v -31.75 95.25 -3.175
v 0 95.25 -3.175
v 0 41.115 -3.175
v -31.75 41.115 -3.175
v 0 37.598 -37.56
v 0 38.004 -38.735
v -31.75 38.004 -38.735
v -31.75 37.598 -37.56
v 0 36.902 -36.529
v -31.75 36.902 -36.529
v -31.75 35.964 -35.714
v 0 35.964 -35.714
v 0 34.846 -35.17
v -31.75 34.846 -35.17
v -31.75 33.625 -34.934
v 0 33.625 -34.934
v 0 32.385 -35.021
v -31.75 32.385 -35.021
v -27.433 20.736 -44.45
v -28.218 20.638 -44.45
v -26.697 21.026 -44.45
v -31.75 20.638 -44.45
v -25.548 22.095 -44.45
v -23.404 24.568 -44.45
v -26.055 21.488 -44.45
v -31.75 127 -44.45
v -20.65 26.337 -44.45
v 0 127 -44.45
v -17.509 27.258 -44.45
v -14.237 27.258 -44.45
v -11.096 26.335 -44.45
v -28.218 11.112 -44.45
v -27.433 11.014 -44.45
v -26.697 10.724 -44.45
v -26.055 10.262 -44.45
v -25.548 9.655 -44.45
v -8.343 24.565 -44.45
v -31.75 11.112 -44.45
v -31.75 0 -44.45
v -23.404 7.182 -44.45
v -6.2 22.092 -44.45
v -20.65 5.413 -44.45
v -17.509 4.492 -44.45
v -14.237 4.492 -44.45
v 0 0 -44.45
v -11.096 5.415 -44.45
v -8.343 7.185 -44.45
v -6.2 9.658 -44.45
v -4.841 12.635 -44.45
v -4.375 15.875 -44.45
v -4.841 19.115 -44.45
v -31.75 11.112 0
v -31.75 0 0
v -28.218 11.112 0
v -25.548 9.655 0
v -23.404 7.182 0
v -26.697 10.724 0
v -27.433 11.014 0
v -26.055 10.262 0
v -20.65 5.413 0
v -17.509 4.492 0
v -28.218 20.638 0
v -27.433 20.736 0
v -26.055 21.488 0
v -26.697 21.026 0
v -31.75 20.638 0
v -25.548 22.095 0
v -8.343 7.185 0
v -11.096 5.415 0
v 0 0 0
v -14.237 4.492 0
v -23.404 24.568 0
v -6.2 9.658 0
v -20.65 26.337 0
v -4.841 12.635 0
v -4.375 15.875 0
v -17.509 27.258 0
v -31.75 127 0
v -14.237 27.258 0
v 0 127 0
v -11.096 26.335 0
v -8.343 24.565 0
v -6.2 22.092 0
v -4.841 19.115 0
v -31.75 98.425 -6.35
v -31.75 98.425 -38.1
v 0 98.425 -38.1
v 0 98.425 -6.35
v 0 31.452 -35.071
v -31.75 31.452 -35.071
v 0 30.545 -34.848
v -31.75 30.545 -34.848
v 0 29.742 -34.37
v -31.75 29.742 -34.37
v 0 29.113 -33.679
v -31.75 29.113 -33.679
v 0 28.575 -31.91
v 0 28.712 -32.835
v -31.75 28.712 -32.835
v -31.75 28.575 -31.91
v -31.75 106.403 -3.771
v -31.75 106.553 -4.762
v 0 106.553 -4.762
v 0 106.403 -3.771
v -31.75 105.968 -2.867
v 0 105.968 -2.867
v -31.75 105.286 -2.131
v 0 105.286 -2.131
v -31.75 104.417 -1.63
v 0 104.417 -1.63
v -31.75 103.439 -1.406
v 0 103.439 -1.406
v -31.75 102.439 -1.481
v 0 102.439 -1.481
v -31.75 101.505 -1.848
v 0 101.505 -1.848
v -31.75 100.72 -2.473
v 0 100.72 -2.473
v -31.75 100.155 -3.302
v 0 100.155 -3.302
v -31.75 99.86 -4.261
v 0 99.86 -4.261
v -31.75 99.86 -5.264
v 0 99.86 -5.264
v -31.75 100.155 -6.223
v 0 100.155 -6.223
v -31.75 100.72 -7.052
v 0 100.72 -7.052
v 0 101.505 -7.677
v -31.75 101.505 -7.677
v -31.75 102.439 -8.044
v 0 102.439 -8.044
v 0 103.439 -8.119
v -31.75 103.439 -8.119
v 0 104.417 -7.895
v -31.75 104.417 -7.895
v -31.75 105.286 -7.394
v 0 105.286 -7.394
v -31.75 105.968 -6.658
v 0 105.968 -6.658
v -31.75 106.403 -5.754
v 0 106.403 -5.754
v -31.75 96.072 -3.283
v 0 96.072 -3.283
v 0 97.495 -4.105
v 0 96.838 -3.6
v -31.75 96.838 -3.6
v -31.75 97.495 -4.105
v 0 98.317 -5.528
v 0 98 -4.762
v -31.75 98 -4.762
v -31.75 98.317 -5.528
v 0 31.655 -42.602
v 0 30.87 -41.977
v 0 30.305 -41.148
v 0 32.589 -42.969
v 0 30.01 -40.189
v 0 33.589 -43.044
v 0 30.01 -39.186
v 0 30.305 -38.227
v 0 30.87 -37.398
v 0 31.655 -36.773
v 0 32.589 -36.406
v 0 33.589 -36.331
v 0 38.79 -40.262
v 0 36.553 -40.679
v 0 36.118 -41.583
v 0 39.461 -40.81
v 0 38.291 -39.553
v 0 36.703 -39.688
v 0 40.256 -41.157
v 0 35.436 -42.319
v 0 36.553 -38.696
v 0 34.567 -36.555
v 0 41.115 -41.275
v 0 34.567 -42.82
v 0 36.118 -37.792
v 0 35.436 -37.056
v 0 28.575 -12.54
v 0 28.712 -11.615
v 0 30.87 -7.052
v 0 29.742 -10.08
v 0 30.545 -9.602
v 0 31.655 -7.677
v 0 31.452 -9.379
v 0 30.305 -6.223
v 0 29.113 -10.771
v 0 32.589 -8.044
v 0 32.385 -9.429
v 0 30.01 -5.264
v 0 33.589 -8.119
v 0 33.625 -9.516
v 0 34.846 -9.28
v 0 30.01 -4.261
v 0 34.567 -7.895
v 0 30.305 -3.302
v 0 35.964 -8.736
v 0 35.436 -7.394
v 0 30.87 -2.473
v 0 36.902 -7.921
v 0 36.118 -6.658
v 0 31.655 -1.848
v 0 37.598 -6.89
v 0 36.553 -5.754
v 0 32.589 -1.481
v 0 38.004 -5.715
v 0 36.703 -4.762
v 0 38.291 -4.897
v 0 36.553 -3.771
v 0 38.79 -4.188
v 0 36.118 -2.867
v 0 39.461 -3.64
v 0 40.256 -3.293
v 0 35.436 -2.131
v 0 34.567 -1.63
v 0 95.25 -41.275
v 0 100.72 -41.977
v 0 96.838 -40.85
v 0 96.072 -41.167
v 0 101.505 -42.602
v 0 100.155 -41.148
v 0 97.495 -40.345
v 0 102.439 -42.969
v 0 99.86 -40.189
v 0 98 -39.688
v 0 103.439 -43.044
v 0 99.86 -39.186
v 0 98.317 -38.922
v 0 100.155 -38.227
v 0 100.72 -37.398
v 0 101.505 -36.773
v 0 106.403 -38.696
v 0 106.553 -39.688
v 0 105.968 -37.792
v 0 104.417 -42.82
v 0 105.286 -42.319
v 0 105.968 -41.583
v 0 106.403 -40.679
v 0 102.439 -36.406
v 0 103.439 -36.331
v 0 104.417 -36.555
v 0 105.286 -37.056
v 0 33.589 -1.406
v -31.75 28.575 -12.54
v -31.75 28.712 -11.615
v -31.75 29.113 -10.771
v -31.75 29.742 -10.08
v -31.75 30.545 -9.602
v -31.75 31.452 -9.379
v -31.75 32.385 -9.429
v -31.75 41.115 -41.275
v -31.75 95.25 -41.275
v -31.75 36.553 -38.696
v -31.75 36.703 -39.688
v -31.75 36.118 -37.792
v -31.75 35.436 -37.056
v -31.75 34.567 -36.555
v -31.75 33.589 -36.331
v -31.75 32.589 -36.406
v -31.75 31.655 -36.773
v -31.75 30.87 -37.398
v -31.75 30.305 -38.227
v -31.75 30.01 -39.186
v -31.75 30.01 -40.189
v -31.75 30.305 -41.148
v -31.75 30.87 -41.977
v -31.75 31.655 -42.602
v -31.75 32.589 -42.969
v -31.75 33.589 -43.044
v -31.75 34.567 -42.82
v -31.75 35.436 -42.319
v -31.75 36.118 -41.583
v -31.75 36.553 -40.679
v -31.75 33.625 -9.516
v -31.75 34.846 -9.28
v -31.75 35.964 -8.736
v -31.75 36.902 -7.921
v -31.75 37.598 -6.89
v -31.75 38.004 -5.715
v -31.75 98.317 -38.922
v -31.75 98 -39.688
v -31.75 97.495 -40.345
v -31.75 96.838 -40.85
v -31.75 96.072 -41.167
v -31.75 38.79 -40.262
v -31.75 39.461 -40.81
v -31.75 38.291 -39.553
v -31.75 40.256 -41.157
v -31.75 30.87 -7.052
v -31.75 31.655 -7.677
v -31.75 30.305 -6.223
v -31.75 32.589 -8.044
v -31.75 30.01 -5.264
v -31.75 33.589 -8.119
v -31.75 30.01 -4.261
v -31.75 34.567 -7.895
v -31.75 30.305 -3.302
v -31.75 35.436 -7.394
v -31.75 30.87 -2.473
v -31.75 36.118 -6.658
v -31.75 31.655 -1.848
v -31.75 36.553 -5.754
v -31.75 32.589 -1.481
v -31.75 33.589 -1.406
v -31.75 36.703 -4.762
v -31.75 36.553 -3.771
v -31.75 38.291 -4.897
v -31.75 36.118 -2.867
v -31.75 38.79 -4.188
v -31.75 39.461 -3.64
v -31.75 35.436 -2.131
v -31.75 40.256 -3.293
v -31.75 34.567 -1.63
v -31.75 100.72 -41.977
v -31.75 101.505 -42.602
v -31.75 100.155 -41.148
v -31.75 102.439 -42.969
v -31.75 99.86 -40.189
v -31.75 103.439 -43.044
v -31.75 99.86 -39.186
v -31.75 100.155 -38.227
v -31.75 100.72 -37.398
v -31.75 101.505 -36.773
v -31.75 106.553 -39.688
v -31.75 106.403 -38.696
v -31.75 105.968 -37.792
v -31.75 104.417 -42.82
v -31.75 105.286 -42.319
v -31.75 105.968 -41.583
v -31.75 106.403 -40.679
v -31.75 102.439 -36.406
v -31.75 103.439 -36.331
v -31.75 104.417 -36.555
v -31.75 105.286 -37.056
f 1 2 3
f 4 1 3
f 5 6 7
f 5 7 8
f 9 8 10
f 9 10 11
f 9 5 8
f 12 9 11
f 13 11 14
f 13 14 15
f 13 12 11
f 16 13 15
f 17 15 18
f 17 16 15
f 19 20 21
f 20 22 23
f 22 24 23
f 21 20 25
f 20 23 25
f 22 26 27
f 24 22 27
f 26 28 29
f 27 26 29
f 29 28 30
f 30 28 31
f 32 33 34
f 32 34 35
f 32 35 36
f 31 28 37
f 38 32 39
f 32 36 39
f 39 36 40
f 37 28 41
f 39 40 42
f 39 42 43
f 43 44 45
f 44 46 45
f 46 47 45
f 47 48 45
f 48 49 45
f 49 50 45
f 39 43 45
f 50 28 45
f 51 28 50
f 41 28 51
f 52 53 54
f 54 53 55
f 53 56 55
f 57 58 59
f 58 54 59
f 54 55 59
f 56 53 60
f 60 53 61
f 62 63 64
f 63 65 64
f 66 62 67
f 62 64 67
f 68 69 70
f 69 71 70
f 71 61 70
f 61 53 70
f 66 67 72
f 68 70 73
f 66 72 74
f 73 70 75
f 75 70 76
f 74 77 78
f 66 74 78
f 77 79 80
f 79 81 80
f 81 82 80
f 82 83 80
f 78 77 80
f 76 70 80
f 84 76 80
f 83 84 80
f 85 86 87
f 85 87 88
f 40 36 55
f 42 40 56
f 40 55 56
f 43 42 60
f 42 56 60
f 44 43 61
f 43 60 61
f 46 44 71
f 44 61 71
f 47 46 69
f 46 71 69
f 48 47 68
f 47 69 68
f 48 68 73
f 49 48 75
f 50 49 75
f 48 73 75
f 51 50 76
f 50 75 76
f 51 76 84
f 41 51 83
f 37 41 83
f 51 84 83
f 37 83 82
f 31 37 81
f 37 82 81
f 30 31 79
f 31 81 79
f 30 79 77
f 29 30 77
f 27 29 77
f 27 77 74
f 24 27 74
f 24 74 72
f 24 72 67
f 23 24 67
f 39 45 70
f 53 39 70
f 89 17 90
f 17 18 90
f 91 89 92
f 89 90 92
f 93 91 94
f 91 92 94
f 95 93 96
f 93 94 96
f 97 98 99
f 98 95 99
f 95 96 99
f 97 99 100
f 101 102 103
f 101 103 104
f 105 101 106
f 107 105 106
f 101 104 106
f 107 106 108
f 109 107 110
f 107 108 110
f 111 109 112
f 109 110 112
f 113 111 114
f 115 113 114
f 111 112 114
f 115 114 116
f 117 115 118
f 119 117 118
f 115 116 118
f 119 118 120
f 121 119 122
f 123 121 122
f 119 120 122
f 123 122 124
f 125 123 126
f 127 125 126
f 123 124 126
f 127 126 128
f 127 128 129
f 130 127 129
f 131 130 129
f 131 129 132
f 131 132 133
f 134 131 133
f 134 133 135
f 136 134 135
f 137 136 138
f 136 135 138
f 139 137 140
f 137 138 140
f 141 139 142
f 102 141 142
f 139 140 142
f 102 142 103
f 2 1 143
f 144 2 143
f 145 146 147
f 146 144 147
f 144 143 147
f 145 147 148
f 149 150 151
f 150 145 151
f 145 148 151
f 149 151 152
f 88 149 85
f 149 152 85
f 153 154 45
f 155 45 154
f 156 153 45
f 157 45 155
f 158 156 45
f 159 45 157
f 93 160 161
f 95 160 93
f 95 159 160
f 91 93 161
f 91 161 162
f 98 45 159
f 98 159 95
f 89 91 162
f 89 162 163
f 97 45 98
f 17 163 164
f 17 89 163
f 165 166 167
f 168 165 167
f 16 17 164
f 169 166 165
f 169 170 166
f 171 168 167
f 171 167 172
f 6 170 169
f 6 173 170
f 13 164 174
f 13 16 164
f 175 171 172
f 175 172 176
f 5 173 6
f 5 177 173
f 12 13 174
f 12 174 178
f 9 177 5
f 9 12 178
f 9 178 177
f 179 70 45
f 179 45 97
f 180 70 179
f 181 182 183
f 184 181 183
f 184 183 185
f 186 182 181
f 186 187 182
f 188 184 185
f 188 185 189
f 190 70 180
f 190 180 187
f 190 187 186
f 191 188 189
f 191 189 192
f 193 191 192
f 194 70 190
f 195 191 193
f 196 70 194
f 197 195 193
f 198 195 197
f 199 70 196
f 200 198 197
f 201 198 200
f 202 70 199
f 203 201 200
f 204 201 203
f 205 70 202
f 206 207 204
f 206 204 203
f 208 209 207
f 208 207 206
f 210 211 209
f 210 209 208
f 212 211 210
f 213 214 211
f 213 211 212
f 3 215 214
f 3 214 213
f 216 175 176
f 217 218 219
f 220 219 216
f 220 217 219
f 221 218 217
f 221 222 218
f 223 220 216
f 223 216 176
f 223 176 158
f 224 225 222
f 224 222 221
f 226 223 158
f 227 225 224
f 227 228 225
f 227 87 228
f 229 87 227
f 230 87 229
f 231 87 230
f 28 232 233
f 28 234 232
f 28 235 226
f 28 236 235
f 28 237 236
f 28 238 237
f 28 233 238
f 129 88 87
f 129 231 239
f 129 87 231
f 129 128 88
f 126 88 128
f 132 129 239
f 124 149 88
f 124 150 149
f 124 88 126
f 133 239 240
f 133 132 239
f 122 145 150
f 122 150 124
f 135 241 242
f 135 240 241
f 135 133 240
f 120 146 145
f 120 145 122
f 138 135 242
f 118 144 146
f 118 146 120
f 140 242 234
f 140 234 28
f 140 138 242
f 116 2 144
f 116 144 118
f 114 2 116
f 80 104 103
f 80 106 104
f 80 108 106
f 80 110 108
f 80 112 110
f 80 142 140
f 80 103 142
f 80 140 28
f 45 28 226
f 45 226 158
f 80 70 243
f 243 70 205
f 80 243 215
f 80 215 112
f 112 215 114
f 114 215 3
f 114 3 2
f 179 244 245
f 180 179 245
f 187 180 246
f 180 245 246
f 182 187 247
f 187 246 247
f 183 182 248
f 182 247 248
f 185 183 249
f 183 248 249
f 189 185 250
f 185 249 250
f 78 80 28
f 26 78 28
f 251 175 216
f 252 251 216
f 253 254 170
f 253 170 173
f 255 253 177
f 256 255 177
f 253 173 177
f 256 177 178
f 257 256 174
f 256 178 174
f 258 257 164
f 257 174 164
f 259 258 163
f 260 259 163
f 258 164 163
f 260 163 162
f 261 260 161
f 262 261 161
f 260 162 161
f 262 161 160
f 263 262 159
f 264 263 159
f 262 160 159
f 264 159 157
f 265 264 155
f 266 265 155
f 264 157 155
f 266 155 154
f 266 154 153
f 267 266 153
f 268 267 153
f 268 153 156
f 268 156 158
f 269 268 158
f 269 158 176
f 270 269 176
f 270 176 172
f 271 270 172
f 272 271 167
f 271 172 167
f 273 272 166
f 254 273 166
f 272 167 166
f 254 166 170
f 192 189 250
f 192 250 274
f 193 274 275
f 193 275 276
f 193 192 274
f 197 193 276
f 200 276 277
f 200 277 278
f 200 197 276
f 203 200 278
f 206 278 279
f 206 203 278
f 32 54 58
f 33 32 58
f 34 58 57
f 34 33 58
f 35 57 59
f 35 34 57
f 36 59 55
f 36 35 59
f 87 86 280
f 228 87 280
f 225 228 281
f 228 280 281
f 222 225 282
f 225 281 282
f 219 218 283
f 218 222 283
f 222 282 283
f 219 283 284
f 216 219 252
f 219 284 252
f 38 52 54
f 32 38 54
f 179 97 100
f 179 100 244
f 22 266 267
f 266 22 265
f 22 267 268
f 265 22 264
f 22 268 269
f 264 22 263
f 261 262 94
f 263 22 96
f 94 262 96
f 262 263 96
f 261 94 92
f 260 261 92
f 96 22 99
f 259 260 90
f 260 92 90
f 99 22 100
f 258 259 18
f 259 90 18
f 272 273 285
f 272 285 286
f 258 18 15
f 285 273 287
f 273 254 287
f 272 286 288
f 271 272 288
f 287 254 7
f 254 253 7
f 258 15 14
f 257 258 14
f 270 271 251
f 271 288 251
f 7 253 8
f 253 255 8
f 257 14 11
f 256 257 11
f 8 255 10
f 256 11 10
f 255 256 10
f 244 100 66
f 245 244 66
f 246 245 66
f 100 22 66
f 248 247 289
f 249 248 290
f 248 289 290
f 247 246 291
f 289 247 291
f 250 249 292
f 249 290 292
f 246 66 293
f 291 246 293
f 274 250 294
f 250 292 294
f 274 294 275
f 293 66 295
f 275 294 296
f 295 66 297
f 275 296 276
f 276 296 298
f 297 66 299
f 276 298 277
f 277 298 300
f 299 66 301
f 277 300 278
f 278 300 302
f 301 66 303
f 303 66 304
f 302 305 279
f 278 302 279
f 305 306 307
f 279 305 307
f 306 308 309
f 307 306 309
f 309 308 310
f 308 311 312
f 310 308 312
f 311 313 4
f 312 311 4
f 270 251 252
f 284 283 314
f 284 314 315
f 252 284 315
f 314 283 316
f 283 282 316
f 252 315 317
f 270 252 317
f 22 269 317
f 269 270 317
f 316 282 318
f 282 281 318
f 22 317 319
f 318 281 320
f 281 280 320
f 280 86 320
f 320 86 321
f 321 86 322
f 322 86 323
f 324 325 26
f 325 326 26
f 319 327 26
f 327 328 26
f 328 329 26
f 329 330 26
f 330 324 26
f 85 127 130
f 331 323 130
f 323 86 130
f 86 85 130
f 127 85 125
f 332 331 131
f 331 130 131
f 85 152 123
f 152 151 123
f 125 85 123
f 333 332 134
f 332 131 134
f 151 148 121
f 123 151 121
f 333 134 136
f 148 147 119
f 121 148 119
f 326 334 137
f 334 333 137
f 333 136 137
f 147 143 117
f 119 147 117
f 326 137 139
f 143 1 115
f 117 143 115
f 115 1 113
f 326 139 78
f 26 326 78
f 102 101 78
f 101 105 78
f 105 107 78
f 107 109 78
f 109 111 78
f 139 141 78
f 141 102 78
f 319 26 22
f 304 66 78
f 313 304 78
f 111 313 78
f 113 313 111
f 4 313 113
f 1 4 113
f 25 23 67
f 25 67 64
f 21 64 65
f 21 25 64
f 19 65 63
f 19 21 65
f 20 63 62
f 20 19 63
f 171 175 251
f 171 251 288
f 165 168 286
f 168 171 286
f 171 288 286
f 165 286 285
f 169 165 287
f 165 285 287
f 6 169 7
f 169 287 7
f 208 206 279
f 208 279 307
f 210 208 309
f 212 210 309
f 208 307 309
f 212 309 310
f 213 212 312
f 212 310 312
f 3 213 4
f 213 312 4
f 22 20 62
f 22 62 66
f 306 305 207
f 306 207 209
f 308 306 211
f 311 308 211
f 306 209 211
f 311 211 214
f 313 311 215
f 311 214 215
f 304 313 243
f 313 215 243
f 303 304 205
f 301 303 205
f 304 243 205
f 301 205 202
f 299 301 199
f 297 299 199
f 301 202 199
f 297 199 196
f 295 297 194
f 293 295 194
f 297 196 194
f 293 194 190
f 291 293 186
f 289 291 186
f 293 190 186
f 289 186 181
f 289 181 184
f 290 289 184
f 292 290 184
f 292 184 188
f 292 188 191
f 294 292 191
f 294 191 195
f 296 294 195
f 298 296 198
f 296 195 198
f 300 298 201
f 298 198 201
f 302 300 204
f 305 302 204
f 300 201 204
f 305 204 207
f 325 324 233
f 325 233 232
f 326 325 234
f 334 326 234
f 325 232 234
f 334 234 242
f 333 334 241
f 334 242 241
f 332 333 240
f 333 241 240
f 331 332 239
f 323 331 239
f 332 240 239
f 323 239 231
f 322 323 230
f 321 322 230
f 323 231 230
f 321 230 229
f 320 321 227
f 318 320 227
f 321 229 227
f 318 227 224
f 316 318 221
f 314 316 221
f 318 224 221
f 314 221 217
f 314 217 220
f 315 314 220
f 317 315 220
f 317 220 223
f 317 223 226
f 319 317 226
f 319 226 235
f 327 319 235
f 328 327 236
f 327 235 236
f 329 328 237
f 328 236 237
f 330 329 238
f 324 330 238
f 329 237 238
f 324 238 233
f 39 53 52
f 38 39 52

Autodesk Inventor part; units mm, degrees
ref_plane "YZ Plane" through (0, 0, 0) normal (1, 0, 0) x (0, 1, 0)
ref_plane "XZ Plane" through (0, 0, 0) normal (0, 1, 0) x (-1, 0, 0)
ref_plane "XY Plane" through (0, 0, 0) normal (0, 0, 1) x (1, 0, 0)
sketch "Sketch1" plane through (0, 0, 0) normal (1, 0, 0) x (0, 1, 0)
  line L0 (0, 0) -> (127, 0)
  line L1 (127, 0) -> (127, -44.45)
  line L2 (127, -44.45) -> (0, -44.45)
  line L3 (0, -44.45) -> (0, 0)
  line L4 (15.875, -44.45) -> (15.875, 0) construction
  line L5 (28.575, -44.45) -> (28.575, 0)
  line L6 (28.575, -44.45) -> (127, 0) construction
  line L7 (127, -44.45) -> (28.575, 0) construction
  arc A0 (28.575, -4.7625) -> (33.3375, 0) centre (33.3375, -4.7625) ccw
  circle A1 centre (33.3375, -4.7625) radius 3.3655
  line L8 (28.575, -22.225) -> (127, -22.225) construction
  line L9 (37.8276, -41.275) -> (98.425, -41.275)
  line L10 (98.425, -41.275) -> (98.425, -3.175)
  line L11 (98.425, -3.175) -> (37.8276, -3.175)
  arc A2 (33.3375, -44.45) -> (28.575, -39.6875) centre (33.3375, -39.6875) ccw
  circle A3 centre (33.3375, -39.6875) radius 3.3655
  circle A4 centre (103.1875, -39.6875) radius 4.7625 construction
  circle A5 centre (103.1875, -39.6875) radius 3.3655
  circle A6 centre (103.1875, -4.7625) radius 4.7625 construction
  circle A7 centre (103.1875, -4.7625) radius 3.3655
  point P0 (77.7875, -22.225)
  dimension "d0" = 127
  dimension "d1" = 44.45
  dimension "d2" = 15.875
  dimension "d4" = 12.7
  dimension "d5" = 9.525
  dimension "d6" = 6.731
  dimension "d7" = 3.175
  dimension "d8" = 3.175
  dimension "d9" = 69.85
  dimension "d10" = 9.525
  dimension "d11" = 6.731
extrude "Extrusion1" add sketch "Sketch1" against normal blind 31.75 contours L0 L5 L2 L3 | L0 A0 L5 | L0 L1 L2 A2 L9 L10 L11 A0 | L5 A2 L2
fillet "Fillet1" radius 3.175 6 edges at (-15.875, 28.575, -39.6875) (-15.875, 37.8276, -41.275) (-15.875, 98.425, -41.275) (-15.875, 98.425, -3.175) (-15.875, 37.8276, -3.175) (-15.875, 28.575, -4.7625)
sketch "Sketch2" plane through (0, 0, 0) normal (0, 0, 1) x (1, 0, 0)
  line L0 (0, 0) -> (-31.75, 0) construction
  line L1 (-15.875, 0) -> (-15.875, 127) construction
  line L2 (0, 127) -> (-31.75, 127) construction
  circle A0 centre (-15.875, 15.875) radius 11.5
  line L3 (-38.875, 11.1125) -> (-15.875, 11.1125)
  line L4 (-15.875, 11.1125) -> (-15.875, 20.6375)
  line L5 (-15.875, 20.6375) -> (-38.875, 20.6375)
  line L6 (-38.875, 20.6375) -> (-38.875, 11.1125)
  line L7 (-38.875, 11.1125) -> (-15.875, 20.6375) construction
  line L8 (-15.875, 11.1125) -> (-38.875, 20.6375) construction
  line L9 (-15.875, 15.875) -> (-27.375, 15.875) construction
  point P0 (-26.3425, 11.1125)
  point P1 (-26.3425, 20.6375)
  dimension "d15" = 23
  dimension "d16" = 15.875
  dimension "d17" = 9.525
extrude "Extrusion2" cut sketch "Sketch2" against normal through all
fillet "Fillet2" radius 3.175 2 edges at (-26.3425, 11.1125, -22.225) (-26.3425, 20.6375, -22.225)
equation "\"d8\" = d7"
properties part number "Pod" material "Rubber, Silicone"
